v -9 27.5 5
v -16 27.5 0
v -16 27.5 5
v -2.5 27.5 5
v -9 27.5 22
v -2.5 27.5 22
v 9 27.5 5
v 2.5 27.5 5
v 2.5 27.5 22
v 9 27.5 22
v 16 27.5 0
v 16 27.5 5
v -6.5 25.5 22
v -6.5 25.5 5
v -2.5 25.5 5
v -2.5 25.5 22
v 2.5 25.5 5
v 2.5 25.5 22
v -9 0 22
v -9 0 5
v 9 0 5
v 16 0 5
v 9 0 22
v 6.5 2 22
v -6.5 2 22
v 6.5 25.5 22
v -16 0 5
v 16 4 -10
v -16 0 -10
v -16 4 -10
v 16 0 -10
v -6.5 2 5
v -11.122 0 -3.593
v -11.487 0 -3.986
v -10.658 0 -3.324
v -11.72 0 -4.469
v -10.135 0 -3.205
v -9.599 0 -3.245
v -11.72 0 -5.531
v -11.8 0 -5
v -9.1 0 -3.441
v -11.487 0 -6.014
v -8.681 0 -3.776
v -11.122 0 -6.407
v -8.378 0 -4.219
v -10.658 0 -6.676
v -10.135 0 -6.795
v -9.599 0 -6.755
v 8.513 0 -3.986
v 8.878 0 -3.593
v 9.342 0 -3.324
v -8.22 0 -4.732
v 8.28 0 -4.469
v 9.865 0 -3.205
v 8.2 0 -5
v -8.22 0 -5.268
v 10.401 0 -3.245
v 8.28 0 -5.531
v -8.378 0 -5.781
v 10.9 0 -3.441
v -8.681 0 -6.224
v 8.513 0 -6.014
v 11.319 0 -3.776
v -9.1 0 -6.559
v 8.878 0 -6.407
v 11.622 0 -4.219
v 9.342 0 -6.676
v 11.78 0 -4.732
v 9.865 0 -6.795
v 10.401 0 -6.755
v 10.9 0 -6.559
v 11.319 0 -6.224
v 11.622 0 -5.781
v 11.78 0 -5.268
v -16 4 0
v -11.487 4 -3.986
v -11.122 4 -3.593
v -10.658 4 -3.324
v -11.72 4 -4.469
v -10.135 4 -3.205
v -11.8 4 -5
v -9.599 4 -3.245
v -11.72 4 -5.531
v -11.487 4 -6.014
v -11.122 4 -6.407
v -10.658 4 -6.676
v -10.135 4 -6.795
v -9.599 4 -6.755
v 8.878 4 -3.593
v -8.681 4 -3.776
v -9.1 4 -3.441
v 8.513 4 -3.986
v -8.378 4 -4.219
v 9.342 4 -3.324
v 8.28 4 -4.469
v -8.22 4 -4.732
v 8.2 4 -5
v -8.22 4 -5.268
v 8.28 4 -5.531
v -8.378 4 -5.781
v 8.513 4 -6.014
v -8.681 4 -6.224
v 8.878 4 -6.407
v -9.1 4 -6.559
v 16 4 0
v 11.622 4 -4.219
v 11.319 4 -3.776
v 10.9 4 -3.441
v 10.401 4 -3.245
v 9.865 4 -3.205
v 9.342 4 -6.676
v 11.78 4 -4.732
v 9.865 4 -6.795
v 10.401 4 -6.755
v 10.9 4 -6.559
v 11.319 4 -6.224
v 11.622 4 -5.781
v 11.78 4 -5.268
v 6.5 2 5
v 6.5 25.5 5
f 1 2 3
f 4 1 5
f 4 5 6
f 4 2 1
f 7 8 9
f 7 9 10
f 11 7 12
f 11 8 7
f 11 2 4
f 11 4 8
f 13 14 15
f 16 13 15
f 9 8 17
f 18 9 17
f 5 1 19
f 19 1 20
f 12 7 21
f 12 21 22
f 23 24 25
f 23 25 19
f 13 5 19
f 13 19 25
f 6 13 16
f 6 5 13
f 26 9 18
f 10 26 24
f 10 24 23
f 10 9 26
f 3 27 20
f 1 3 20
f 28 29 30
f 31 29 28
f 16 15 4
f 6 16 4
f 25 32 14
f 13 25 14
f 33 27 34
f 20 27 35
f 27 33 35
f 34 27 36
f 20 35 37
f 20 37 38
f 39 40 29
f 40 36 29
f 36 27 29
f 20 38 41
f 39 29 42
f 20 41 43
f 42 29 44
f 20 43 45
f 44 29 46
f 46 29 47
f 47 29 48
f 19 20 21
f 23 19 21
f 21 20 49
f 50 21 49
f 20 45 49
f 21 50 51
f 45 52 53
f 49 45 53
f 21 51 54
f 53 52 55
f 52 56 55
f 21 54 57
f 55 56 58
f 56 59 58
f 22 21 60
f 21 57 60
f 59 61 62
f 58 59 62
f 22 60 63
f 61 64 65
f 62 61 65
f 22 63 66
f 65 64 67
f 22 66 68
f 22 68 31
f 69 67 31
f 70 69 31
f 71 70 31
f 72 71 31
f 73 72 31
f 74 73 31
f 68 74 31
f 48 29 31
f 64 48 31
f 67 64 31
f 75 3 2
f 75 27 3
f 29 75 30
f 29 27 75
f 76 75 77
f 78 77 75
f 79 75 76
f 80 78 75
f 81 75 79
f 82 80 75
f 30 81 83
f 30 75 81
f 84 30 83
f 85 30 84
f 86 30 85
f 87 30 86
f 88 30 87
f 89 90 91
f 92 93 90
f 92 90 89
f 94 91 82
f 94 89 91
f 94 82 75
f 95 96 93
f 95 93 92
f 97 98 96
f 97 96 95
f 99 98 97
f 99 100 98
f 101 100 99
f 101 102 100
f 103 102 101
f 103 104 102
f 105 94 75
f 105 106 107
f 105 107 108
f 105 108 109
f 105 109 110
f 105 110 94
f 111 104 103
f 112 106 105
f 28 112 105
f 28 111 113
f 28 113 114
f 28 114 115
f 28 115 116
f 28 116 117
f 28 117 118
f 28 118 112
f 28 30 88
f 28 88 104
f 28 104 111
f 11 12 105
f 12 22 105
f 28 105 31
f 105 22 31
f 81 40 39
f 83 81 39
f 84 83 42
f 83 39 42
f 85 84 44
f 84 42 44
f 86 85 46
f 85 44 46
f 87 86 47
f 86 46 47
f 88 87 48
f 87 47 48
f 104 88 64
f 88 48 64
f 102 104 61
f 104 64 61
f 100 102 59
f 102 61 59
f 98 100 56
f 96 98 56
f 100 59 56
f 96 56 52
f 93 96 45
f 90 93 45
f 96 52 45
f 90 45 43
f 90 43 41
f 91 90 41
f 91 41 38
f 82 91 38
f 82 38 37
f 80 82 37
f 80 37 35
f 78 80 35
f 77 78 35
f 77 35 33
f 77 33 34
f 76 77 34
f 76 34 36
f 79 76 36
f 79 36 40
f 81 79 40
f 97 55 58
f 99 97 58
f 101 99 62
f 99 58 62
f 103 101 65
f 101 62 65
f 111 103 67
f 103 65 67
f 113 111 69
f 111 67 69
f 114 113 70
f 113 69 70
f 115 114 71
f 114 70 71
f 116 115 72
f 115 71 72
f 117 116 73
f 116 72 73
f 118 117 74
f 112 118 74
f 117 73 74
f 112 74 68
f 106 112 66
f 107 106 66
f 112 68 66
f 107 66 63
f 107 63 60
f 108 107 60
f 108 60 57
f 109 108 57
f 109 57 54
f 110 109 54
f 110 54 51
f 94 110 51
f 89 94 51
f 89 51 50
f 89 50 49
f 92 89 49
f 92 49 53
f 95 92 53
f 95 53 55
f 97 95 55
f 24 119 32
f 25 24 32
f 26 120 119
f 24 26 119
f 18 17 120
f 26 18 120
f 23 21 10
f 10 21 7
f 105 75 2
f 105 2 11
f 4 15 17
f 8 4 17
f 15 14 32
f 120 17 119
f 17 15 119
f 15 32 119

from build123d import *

# Parameters (mm, degrees)
SKETCH1_W                = 32
SKETCH1_H                = 15
BOSS_EXTRUDE1_DEPTH      = 4
BOSS_EXTRUDE2_START      = 4
SKETCH1_3_W              = 32
SKETCH1_3_H              = 5
BOSS_EXTRUDE2_DEPTH      = 23.5
BOSS_EXTRUDE3_DEPTH      = 17
M3_CLEARANCE_HOLE1_D     = 3.6
M3_CLEARANCE_HOLE1_DEPTH = 10
M3_CLEARANCE_HOLE1_TIP   = 1.081549114


with BuildPart() as part:
    # Sketch1 → Boss-Extrude1 (new body)
    with BuildSketch(Plane(origin=(0, 0, 0), x_dir=(1, 0, 0), z_dir=(0, 1, 0))):
        with Locations((0, 2.5)):
            Rectangle(SKETCH1_W, SKETCH1_H)
    extrude(amount=BOSS_EXTRUDE1_DEPTH)

    # Sketch1<3> → Boss-Extrude2 (add)
    with BuildSketch(Plane(origin=(0, 0, 0), x_dir=(1, 0, 0), z_dir=(0, 1, 0)).offset(BOSS_EXTRUDE2_START)):
        with Locations((0, -2.5)):
            Rectangle(SKETCH1_3_W, SKETCH1_3_H)
    extrude(amount=BOSS_EXTRUDE2_DEPTH)

    # Sketch2 → Boss-Extrude3 (add)
    with BuildSketch(Plane.XY.offset(5)):
        Polygon((-6.5, 2), (-6.5, 25.5), (-2.5, 25.5), (-2.5, 27.5), (-9, 27.5), (-9, 0), (9, 0), (9, 27.5), (2.5, 27.5), (2.5, 25.5), (6.5, 25.5), (6.5, 2), align=None)
    extrude(amount=BOSS_EXTRUDE3_DEPTH)

    # M3 Clearance Hole1
    with Locations(Plane(origin=(0, 4, 0), x_dir=(1, 0, 0), z_dir=(0, 1, 0))):
        with Locations((-10, 5), (10, 5)):
            Hole(M3_CLEARANCE_HOLE1_D / 2, depth=M3_CLEARANCE_HOLE1_DEPTH)
            with Locations((0, 0, -(M3_CLEARANCE_HOLE1_DEPTH + M3_CLEARANCE_HOLE1_TIP / 2))):  # 118° drill point
                Cone(0, M3_CLEARANCE_HOLE1_D / 2, M3_CLEARANCE_HOLE1_TIP, mode=Mode.SUBTRACT)


solid = part.part
